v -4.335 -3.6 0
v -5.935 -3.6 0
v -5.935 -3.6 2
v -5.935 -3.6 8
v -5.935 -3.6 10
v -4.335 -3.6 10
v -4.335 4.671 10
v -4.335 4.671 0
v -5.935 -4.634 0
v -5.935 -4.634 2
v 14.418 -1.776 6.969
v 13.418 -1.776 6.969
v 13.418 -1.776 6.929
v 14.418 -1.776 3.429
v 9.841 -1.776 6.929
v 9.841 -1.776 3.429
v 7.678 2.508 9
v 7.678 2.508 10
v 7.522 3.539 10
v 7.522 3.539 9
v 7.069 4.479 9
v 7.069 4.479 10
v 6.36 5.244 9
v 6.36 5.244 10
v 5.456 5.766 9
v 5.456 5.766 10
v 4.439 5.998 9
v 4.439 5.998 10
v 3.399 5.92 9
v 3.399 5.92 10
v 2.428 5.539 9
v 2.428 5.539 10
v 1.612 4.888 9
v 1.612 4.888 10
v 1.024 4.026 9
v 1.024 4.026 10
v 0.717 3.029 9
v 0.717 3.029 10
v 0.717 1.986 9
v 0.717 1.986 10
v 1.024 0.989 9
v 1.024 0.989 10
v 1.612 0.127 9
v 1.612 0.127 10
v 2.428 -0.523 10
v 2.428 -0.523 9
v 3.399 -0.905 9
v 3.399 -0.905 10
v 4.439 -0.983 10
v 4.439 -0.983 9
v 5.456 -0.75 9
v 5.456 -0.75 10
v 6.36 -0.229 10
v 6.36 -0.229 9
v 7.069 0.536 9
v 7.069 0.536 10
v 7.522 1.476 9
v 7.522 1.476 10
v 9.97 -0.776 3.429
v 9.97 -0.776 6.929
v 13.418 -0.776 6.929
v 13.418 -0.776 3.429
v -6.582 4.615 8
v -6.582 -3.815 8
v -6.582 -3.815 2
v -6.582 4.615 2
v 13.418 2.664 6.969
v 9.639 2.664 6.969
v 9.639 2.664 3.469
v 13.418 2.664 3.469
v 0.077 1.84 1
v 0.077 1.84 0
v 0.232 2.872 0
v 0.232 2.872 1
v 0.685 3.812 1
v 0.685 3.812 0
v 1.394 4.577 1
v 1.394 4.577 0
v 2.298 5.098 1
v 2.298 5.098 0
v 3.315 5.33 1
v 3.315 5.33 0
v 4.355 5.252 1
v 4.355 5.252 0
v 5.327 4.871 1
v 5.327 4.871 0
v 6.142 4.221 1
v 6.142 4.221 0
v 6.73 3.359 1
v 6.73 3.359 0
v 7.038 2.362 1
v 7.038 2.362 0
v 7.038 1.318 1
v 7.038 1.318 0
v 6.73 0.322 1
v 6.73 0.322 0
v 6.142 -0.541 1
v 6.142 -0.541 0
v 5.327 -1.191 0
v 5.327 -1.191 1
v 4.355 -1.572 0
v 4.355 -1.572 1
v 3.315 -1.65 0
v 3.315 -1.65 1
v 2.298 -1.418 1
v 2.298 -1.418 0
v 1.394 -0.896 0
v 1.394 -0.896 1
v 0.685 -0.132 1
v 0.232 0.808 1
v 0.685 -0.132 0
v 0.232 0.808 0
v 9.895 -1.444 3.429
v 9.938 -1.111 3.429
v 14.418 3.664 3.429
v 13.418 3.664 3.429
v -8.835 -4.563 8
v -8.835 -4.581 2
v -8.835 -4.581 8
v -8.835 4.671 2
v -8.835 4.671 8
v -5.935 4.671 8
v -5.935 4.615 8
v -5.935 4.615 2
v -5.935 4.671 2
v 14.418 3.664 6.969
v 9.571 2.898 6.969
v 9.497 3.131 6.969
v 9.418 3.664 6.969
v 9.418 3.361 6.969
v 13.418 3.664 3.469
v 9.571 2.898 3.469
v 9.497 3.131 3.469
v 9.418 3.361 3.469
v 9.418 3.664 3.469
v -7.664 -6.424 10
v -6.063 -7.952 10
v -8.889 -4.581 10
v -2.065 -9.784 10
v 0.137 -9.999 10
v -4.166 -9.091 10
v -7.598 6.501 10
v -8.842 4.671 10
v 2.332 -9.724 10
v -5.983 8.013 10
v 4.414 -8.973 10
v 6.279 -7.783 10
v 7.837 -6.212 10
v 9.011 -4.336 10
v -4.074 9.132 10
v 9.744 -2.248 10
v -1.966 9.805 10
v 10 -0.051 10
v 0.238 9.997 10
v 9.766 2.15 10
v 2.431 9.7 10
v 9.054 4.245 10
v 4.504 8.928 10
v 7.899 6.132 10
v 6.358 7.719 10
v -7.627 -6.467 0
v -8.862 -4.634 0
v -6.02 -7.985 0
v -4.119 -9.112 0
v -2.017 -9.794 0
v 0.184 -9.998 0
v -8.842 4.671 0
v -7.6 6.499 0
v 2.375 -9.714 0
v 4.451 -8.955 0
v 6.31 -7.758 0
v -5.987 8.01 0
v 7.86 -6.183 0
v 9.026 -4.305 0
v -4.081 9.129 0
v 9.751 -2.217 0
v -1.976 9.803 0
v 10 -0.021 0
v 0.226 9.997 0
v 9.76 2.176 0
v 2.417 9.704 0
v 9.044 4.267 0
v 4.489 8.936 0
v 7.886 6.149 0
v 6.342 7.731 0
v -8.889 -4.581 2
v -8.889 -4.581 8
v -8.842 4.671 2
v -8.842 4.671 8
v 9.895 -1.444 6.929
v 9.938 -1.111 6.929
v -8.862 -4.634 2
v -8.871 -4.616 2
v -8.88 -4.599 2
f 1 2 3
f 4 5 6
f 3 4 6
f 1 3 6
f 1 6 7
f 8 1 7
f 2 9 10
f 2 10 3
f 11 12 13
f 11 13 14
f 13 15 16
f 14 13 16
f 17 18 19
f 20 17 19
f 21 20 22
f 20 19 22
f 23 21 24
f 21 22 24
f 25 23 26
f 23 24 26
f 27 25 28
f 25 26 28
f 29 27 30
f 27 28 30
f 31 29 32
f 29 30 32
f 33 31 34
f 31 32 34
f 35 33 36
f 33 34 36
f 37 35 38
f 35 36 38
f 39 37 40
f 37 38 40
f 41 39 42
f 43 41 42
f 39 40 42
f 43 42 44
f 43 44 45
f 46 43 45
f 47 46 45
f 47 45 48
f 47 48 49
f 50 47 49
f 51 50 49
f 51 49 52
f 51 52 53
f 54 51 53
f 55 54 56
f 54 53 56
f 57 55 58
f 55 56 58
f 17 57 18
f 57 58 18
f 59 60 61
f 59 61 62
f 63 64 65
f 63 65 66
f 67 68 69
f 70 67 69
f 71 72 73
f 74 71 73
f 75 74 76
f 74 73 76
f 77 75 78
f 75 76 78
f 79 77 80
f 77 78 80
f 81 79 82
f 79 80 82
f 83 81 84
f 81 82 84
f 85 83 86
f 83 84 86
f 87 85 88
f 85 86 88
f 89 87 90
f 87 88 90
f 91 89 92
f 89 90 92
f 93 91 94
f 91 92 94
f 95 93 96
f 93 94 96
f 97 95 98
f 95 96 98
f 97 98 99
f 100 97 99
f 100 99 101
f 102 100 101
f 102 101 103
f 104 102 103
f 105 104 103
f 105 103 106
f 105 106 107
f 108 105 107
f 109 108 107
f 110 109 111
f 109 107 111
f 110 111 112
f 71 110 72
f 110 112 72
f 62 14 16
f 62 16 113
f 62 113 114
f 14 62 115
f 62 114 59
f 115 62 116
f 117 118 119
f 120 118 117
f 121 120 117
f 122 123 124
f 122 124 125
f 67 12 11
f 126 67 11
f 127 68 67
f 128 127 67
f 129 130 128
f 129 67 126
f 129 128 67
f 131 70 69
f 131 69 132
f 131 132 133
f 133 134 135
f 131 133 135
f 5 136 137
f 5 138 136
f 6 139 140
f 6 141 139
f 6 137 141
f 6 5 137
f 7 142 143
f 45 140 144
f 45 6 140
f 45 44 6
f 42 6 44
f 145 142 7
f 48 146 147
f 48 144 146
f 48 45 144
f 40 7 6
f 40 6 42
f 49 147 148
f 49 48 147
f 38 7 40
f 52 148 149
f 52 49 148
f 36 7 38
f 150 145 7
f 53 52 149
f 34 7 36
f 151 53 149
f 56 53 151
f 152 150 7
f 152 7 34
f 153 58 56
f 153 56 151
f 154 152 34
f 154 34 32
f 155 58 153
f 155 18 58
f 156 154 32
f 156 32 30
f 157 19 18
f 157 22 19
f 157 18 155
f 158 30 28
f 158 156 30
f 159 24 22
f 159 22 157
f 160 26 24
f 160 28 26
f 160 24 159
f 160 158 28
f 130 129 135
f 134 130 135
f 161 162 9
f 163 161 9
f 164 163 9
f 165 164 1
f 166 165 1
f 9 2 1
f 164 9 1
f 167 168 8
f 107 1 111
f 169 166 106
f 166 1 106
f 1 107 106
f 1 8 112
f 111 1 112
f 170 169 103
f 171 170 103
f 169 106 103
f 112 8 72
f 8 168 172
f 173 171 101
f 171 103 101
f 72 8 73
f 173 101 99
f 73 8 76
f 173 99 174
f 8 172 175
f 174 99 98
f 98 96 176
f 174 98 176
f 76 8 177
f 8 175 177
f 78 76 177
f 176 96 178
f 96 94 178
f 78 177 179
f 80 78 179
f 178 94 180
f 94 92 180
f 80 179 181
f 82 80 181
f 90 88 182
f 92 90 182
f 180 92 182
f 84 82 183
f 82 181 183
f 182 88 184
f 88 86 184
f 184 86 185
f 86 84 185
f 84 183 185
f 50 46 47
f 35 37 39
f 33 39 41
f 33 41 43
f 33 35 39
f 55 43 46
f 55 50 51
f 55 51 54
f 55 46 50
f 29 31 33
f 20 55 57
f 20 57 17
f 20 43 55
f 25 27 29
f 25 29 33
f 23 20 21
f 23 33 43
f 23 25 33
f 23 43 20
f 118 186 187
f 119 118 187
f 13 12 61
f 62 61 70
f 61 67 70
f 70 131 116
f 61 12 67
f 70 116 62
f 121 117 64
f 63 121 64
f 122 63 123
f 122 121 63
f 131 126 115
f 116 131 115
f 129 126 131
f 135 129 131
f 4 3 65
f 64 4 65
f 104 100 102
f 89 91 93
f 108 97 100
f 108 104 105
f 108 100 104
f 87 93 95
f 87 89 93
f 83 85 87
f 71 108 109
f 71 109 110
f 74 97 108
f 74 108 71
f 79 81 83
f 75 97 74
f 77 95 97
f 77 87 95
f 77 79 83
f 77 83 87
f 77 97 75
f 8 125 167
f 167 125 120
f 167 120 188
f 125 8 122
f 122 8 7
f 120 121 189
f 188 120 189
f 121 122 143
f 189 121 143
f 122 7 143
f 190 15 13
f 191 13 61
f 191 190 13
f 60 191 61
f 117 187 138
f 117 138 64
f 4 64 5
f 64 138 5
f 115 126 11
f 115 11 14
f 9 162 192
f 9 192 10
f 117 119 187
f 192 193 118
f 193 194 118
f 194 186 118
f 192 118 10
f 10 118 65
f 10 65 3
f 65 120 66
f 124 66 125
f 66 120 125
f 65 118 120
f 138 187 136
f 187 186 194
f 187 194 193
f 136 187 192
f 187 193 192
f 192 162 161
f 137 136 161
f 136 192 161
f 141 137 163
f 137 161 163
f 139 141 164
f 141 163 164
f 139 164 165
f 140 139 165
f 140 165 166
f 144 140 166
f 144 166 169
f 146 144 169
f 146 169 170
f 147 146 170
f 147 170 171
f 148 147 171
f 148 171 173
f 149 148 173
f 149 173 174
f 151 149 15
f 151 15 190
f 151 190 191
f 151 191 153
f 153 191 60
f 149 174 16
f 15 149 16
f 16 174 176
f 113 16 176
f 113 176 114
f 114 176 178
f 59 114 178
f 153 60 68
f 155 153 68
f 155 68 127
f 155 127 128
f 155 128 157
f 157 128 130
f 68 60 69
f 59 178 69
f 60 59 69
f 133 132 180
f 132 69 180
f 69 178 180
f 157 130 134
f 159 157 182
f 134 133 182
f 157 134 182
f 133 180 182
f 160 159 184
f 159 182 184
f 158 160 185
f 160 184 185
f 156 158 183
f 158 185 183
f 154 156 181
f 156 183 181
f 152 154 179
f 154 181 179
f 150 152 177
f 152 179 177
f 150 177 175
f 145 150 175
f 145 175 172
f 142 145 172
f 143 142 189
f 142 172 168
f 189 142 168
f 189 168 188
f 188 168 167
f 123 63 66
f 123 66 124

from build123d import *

# Parameters (mm, degrees)
SKETCH_1_R          = 10
EXTRUDE_1_DEPTH     = 10
SKETCH_2_W          = 1.600186535
SKETCH_2_H          = 8.27120278
CUT_EXTRUDE_1_DEPTH = 10
CUT_EXTRUDE_2_DEPTH = 2
CUT_EXTRUDE_3_DEPTH = 2
CUT_EXTRUDE_4_DEPTH = 3.5
CUT_EXTRUDE_5_DEPTH = 8
SKETCH_16_W         = 6
SKETCH_16_H         = 9.252604953
CUT_EXTRUDE_7_DEPTH = 1
SKETCH_17_R         = 3.5
CUT_EXTRUDE_8_DEPTH = 1
SKETCH_18_R         = 3.5
CUT_EXTRUDE_9_DEPTH = 1
SKETCH_19_W         = 3.5
SKETCH_19_H         = 1
EXTRUDE_2_DEPTH     = 4
SKETCH_20_W         = 3.5
SKETCH_20_H         = 1
EXTRUDE_3_DEPTH     = 4
SKETCH_21_W         = 3.540013918
SKETCH_21_H         = 5.43980515
EXTRUDE_4_DEPTH     = 1


with BuildPart() as part:
    # 草圖1 → 填料-伸長1 (new body)
    with BuildSketch(Plane.XY):
        Circle(SKETCH_1_R)
    extrude(amount=EXTRUDE_1_DEPTH)

    # 草圖2 → 除料-伸長1 (cut)
    with BuildSketch(Plane.XY.offset(10)):
        with Locations((-5.134616168, 0.535617876)):
            Rectangle(SKETCH_2_W, SKETCH_2_H)
    extrude(amount=-CUT_EXTRUDE_1_DEPTH, mode=Mode.SUBTRACT)

    # 草圖3 → 除料-伸長2 (cut)
    with BuildSketch(Plane.XY.offset(10)):
        with BuildLine():
            Line((-5.934709435, 4.671219266), (-8.84192912, 4.671219266))
            ThreePointArc((-8.84192912, 4.671219266), (-10.338729016, 0.052381637), (-8.888807861, -4.581385687))
            Line((-8.888807861, -4.581385687), (-5.934709435, -3.599983514))
            Line((-5.934709435, -3.599983514), (-5.934709435, 4.671219266))
        make_face()
    extrude(amount=-CUT_EXTRUDE_2_DEPTH, mode=Mode.SUBTRACT)

    # 草圖4 → 除料-伸長3 (cut)
    with BuildSketch(Plane(origin=(0, 0, 0), x_dir=(-1, 0, 0), z_dir=(0, 0, -1))):
        with BuildLine():
            Line((5.934709435, 4.671219266), (8.84192912, 4.671219266))
            ThreePointArc((8.84192912, 4.671219266), (10.34374886, 0.021931836), (8.86165829, -4.633682375))
            Line((8.86165829, -4.633682375), (5.934709435, -4.633682375))
            Line((5.934709435, -4.633682375), (5.934709435, 4.671219266))
        make_face()
    extrude(amount=-CUT_EXTRUDE_3_DEPTH, mode=Mode.SUBTRACT)

    # 草圖7 → 除料-伸長4 (cut)
    with BuildSketch(Plane.ZY.offset(13.3345229)):
        Polygon((2, 4.671219266), (8, 4.671219266), (8, -4.581385687), (2, -4.633682375), align=None)
    extrude(amount=-CUT_EXTRUDE_4_DEPTH, mode=Mode.SUBTRACT)

    # 草圖9 → 除料-伸長5 (cut)
    with BuildSketch(Plane.XY.offset(8)):
        Polygon((-5.934709435, 4.614635236), (-5.934709435, -3.599983514), (-6.581816343, -3.814963529), (-6.581816343, 4.614635236), align=None)
    extrude(amount=-CUT_EXTRUDE_5_DEPTH, mode=Mode.SUBTRACT)

    # 草圖16 → 除料-伸長7 (cut)
    with BuildSketch(Plane.ZY.offset(9.8345229)):
        with Locations((5, 0.04491679)):
            Rectangle(SKETCH_16_W, SKETCH_16_H)
    extrude(amount=-CUT_EXTRUDE_7_DEPTH, mode=Mode.SUBTRACT)

    # 草圖17 → 除料-伸長8 (cut)
    with BuildSketch(Plane(origin=(0, 0, 0), x_dir=(-1, 0, 0), z_dir=(0, 0, -1))):
        with Locations((-3.576623966, 1.840103877)):
            Circle(SKETCH_17_R)
    extrude(amount=-CUT_EXTRUDE_8_DEPTH, mode=Mode.SUBTRACT)

    # 草圖18 → 除料-伸長9 (cut)
    with BuildSketch(Plane.XY.offset(10)):
        with Locations((4.177553206, 2.507636002)):
            Circle(SKETCH_18_R)
    extrude(amount=-CUT_EXTRUDE_9_DEPTH, mode=Mode.SUBTRACT)

    # 草圖19 → 填料-伸長2 (add)
    with BuildSketch(Plane(origin=(9.418183657, 0, 0), x_dir=(0, 0, -1), z_dir=(1, 0, 0))):
        with Locations((-5.219032707, 3.16388309)):
            Rectangle(SKETCH_19_W, SKETCH_19_H)
    extrude(amount=EXTRUDE_2_DEPTH)

    # 草圖20 → 填料-伸長3 (add)
    with BuildSketch(Plane(origin=(9.418183657, 0, 0), x_dir=(0, 0, -1), z_dir=(1, 0, 0))):
        with Locations((-5.179018789, -1.27592206)):
            Rectangle(SKETCH_20_W, SKETCH_20_H)
    extrude(amount=EXTRUDE_3_DEPTH)

    # 草圖21 → 填料-伸長4 (add)
    with BuildSketch(Plane(origin=(13.418183657, 0, 0), x_dir=(0, 0, -1), z_dir=(1, 0, 0))):
        with Locations((-5.199025748, 0.943980515)):
            Rectangle(SKETCH_21_W, SKETCH_21_H)
    extrude(amount=EXTRUDE_4_DEPTH)


solid = part.part
